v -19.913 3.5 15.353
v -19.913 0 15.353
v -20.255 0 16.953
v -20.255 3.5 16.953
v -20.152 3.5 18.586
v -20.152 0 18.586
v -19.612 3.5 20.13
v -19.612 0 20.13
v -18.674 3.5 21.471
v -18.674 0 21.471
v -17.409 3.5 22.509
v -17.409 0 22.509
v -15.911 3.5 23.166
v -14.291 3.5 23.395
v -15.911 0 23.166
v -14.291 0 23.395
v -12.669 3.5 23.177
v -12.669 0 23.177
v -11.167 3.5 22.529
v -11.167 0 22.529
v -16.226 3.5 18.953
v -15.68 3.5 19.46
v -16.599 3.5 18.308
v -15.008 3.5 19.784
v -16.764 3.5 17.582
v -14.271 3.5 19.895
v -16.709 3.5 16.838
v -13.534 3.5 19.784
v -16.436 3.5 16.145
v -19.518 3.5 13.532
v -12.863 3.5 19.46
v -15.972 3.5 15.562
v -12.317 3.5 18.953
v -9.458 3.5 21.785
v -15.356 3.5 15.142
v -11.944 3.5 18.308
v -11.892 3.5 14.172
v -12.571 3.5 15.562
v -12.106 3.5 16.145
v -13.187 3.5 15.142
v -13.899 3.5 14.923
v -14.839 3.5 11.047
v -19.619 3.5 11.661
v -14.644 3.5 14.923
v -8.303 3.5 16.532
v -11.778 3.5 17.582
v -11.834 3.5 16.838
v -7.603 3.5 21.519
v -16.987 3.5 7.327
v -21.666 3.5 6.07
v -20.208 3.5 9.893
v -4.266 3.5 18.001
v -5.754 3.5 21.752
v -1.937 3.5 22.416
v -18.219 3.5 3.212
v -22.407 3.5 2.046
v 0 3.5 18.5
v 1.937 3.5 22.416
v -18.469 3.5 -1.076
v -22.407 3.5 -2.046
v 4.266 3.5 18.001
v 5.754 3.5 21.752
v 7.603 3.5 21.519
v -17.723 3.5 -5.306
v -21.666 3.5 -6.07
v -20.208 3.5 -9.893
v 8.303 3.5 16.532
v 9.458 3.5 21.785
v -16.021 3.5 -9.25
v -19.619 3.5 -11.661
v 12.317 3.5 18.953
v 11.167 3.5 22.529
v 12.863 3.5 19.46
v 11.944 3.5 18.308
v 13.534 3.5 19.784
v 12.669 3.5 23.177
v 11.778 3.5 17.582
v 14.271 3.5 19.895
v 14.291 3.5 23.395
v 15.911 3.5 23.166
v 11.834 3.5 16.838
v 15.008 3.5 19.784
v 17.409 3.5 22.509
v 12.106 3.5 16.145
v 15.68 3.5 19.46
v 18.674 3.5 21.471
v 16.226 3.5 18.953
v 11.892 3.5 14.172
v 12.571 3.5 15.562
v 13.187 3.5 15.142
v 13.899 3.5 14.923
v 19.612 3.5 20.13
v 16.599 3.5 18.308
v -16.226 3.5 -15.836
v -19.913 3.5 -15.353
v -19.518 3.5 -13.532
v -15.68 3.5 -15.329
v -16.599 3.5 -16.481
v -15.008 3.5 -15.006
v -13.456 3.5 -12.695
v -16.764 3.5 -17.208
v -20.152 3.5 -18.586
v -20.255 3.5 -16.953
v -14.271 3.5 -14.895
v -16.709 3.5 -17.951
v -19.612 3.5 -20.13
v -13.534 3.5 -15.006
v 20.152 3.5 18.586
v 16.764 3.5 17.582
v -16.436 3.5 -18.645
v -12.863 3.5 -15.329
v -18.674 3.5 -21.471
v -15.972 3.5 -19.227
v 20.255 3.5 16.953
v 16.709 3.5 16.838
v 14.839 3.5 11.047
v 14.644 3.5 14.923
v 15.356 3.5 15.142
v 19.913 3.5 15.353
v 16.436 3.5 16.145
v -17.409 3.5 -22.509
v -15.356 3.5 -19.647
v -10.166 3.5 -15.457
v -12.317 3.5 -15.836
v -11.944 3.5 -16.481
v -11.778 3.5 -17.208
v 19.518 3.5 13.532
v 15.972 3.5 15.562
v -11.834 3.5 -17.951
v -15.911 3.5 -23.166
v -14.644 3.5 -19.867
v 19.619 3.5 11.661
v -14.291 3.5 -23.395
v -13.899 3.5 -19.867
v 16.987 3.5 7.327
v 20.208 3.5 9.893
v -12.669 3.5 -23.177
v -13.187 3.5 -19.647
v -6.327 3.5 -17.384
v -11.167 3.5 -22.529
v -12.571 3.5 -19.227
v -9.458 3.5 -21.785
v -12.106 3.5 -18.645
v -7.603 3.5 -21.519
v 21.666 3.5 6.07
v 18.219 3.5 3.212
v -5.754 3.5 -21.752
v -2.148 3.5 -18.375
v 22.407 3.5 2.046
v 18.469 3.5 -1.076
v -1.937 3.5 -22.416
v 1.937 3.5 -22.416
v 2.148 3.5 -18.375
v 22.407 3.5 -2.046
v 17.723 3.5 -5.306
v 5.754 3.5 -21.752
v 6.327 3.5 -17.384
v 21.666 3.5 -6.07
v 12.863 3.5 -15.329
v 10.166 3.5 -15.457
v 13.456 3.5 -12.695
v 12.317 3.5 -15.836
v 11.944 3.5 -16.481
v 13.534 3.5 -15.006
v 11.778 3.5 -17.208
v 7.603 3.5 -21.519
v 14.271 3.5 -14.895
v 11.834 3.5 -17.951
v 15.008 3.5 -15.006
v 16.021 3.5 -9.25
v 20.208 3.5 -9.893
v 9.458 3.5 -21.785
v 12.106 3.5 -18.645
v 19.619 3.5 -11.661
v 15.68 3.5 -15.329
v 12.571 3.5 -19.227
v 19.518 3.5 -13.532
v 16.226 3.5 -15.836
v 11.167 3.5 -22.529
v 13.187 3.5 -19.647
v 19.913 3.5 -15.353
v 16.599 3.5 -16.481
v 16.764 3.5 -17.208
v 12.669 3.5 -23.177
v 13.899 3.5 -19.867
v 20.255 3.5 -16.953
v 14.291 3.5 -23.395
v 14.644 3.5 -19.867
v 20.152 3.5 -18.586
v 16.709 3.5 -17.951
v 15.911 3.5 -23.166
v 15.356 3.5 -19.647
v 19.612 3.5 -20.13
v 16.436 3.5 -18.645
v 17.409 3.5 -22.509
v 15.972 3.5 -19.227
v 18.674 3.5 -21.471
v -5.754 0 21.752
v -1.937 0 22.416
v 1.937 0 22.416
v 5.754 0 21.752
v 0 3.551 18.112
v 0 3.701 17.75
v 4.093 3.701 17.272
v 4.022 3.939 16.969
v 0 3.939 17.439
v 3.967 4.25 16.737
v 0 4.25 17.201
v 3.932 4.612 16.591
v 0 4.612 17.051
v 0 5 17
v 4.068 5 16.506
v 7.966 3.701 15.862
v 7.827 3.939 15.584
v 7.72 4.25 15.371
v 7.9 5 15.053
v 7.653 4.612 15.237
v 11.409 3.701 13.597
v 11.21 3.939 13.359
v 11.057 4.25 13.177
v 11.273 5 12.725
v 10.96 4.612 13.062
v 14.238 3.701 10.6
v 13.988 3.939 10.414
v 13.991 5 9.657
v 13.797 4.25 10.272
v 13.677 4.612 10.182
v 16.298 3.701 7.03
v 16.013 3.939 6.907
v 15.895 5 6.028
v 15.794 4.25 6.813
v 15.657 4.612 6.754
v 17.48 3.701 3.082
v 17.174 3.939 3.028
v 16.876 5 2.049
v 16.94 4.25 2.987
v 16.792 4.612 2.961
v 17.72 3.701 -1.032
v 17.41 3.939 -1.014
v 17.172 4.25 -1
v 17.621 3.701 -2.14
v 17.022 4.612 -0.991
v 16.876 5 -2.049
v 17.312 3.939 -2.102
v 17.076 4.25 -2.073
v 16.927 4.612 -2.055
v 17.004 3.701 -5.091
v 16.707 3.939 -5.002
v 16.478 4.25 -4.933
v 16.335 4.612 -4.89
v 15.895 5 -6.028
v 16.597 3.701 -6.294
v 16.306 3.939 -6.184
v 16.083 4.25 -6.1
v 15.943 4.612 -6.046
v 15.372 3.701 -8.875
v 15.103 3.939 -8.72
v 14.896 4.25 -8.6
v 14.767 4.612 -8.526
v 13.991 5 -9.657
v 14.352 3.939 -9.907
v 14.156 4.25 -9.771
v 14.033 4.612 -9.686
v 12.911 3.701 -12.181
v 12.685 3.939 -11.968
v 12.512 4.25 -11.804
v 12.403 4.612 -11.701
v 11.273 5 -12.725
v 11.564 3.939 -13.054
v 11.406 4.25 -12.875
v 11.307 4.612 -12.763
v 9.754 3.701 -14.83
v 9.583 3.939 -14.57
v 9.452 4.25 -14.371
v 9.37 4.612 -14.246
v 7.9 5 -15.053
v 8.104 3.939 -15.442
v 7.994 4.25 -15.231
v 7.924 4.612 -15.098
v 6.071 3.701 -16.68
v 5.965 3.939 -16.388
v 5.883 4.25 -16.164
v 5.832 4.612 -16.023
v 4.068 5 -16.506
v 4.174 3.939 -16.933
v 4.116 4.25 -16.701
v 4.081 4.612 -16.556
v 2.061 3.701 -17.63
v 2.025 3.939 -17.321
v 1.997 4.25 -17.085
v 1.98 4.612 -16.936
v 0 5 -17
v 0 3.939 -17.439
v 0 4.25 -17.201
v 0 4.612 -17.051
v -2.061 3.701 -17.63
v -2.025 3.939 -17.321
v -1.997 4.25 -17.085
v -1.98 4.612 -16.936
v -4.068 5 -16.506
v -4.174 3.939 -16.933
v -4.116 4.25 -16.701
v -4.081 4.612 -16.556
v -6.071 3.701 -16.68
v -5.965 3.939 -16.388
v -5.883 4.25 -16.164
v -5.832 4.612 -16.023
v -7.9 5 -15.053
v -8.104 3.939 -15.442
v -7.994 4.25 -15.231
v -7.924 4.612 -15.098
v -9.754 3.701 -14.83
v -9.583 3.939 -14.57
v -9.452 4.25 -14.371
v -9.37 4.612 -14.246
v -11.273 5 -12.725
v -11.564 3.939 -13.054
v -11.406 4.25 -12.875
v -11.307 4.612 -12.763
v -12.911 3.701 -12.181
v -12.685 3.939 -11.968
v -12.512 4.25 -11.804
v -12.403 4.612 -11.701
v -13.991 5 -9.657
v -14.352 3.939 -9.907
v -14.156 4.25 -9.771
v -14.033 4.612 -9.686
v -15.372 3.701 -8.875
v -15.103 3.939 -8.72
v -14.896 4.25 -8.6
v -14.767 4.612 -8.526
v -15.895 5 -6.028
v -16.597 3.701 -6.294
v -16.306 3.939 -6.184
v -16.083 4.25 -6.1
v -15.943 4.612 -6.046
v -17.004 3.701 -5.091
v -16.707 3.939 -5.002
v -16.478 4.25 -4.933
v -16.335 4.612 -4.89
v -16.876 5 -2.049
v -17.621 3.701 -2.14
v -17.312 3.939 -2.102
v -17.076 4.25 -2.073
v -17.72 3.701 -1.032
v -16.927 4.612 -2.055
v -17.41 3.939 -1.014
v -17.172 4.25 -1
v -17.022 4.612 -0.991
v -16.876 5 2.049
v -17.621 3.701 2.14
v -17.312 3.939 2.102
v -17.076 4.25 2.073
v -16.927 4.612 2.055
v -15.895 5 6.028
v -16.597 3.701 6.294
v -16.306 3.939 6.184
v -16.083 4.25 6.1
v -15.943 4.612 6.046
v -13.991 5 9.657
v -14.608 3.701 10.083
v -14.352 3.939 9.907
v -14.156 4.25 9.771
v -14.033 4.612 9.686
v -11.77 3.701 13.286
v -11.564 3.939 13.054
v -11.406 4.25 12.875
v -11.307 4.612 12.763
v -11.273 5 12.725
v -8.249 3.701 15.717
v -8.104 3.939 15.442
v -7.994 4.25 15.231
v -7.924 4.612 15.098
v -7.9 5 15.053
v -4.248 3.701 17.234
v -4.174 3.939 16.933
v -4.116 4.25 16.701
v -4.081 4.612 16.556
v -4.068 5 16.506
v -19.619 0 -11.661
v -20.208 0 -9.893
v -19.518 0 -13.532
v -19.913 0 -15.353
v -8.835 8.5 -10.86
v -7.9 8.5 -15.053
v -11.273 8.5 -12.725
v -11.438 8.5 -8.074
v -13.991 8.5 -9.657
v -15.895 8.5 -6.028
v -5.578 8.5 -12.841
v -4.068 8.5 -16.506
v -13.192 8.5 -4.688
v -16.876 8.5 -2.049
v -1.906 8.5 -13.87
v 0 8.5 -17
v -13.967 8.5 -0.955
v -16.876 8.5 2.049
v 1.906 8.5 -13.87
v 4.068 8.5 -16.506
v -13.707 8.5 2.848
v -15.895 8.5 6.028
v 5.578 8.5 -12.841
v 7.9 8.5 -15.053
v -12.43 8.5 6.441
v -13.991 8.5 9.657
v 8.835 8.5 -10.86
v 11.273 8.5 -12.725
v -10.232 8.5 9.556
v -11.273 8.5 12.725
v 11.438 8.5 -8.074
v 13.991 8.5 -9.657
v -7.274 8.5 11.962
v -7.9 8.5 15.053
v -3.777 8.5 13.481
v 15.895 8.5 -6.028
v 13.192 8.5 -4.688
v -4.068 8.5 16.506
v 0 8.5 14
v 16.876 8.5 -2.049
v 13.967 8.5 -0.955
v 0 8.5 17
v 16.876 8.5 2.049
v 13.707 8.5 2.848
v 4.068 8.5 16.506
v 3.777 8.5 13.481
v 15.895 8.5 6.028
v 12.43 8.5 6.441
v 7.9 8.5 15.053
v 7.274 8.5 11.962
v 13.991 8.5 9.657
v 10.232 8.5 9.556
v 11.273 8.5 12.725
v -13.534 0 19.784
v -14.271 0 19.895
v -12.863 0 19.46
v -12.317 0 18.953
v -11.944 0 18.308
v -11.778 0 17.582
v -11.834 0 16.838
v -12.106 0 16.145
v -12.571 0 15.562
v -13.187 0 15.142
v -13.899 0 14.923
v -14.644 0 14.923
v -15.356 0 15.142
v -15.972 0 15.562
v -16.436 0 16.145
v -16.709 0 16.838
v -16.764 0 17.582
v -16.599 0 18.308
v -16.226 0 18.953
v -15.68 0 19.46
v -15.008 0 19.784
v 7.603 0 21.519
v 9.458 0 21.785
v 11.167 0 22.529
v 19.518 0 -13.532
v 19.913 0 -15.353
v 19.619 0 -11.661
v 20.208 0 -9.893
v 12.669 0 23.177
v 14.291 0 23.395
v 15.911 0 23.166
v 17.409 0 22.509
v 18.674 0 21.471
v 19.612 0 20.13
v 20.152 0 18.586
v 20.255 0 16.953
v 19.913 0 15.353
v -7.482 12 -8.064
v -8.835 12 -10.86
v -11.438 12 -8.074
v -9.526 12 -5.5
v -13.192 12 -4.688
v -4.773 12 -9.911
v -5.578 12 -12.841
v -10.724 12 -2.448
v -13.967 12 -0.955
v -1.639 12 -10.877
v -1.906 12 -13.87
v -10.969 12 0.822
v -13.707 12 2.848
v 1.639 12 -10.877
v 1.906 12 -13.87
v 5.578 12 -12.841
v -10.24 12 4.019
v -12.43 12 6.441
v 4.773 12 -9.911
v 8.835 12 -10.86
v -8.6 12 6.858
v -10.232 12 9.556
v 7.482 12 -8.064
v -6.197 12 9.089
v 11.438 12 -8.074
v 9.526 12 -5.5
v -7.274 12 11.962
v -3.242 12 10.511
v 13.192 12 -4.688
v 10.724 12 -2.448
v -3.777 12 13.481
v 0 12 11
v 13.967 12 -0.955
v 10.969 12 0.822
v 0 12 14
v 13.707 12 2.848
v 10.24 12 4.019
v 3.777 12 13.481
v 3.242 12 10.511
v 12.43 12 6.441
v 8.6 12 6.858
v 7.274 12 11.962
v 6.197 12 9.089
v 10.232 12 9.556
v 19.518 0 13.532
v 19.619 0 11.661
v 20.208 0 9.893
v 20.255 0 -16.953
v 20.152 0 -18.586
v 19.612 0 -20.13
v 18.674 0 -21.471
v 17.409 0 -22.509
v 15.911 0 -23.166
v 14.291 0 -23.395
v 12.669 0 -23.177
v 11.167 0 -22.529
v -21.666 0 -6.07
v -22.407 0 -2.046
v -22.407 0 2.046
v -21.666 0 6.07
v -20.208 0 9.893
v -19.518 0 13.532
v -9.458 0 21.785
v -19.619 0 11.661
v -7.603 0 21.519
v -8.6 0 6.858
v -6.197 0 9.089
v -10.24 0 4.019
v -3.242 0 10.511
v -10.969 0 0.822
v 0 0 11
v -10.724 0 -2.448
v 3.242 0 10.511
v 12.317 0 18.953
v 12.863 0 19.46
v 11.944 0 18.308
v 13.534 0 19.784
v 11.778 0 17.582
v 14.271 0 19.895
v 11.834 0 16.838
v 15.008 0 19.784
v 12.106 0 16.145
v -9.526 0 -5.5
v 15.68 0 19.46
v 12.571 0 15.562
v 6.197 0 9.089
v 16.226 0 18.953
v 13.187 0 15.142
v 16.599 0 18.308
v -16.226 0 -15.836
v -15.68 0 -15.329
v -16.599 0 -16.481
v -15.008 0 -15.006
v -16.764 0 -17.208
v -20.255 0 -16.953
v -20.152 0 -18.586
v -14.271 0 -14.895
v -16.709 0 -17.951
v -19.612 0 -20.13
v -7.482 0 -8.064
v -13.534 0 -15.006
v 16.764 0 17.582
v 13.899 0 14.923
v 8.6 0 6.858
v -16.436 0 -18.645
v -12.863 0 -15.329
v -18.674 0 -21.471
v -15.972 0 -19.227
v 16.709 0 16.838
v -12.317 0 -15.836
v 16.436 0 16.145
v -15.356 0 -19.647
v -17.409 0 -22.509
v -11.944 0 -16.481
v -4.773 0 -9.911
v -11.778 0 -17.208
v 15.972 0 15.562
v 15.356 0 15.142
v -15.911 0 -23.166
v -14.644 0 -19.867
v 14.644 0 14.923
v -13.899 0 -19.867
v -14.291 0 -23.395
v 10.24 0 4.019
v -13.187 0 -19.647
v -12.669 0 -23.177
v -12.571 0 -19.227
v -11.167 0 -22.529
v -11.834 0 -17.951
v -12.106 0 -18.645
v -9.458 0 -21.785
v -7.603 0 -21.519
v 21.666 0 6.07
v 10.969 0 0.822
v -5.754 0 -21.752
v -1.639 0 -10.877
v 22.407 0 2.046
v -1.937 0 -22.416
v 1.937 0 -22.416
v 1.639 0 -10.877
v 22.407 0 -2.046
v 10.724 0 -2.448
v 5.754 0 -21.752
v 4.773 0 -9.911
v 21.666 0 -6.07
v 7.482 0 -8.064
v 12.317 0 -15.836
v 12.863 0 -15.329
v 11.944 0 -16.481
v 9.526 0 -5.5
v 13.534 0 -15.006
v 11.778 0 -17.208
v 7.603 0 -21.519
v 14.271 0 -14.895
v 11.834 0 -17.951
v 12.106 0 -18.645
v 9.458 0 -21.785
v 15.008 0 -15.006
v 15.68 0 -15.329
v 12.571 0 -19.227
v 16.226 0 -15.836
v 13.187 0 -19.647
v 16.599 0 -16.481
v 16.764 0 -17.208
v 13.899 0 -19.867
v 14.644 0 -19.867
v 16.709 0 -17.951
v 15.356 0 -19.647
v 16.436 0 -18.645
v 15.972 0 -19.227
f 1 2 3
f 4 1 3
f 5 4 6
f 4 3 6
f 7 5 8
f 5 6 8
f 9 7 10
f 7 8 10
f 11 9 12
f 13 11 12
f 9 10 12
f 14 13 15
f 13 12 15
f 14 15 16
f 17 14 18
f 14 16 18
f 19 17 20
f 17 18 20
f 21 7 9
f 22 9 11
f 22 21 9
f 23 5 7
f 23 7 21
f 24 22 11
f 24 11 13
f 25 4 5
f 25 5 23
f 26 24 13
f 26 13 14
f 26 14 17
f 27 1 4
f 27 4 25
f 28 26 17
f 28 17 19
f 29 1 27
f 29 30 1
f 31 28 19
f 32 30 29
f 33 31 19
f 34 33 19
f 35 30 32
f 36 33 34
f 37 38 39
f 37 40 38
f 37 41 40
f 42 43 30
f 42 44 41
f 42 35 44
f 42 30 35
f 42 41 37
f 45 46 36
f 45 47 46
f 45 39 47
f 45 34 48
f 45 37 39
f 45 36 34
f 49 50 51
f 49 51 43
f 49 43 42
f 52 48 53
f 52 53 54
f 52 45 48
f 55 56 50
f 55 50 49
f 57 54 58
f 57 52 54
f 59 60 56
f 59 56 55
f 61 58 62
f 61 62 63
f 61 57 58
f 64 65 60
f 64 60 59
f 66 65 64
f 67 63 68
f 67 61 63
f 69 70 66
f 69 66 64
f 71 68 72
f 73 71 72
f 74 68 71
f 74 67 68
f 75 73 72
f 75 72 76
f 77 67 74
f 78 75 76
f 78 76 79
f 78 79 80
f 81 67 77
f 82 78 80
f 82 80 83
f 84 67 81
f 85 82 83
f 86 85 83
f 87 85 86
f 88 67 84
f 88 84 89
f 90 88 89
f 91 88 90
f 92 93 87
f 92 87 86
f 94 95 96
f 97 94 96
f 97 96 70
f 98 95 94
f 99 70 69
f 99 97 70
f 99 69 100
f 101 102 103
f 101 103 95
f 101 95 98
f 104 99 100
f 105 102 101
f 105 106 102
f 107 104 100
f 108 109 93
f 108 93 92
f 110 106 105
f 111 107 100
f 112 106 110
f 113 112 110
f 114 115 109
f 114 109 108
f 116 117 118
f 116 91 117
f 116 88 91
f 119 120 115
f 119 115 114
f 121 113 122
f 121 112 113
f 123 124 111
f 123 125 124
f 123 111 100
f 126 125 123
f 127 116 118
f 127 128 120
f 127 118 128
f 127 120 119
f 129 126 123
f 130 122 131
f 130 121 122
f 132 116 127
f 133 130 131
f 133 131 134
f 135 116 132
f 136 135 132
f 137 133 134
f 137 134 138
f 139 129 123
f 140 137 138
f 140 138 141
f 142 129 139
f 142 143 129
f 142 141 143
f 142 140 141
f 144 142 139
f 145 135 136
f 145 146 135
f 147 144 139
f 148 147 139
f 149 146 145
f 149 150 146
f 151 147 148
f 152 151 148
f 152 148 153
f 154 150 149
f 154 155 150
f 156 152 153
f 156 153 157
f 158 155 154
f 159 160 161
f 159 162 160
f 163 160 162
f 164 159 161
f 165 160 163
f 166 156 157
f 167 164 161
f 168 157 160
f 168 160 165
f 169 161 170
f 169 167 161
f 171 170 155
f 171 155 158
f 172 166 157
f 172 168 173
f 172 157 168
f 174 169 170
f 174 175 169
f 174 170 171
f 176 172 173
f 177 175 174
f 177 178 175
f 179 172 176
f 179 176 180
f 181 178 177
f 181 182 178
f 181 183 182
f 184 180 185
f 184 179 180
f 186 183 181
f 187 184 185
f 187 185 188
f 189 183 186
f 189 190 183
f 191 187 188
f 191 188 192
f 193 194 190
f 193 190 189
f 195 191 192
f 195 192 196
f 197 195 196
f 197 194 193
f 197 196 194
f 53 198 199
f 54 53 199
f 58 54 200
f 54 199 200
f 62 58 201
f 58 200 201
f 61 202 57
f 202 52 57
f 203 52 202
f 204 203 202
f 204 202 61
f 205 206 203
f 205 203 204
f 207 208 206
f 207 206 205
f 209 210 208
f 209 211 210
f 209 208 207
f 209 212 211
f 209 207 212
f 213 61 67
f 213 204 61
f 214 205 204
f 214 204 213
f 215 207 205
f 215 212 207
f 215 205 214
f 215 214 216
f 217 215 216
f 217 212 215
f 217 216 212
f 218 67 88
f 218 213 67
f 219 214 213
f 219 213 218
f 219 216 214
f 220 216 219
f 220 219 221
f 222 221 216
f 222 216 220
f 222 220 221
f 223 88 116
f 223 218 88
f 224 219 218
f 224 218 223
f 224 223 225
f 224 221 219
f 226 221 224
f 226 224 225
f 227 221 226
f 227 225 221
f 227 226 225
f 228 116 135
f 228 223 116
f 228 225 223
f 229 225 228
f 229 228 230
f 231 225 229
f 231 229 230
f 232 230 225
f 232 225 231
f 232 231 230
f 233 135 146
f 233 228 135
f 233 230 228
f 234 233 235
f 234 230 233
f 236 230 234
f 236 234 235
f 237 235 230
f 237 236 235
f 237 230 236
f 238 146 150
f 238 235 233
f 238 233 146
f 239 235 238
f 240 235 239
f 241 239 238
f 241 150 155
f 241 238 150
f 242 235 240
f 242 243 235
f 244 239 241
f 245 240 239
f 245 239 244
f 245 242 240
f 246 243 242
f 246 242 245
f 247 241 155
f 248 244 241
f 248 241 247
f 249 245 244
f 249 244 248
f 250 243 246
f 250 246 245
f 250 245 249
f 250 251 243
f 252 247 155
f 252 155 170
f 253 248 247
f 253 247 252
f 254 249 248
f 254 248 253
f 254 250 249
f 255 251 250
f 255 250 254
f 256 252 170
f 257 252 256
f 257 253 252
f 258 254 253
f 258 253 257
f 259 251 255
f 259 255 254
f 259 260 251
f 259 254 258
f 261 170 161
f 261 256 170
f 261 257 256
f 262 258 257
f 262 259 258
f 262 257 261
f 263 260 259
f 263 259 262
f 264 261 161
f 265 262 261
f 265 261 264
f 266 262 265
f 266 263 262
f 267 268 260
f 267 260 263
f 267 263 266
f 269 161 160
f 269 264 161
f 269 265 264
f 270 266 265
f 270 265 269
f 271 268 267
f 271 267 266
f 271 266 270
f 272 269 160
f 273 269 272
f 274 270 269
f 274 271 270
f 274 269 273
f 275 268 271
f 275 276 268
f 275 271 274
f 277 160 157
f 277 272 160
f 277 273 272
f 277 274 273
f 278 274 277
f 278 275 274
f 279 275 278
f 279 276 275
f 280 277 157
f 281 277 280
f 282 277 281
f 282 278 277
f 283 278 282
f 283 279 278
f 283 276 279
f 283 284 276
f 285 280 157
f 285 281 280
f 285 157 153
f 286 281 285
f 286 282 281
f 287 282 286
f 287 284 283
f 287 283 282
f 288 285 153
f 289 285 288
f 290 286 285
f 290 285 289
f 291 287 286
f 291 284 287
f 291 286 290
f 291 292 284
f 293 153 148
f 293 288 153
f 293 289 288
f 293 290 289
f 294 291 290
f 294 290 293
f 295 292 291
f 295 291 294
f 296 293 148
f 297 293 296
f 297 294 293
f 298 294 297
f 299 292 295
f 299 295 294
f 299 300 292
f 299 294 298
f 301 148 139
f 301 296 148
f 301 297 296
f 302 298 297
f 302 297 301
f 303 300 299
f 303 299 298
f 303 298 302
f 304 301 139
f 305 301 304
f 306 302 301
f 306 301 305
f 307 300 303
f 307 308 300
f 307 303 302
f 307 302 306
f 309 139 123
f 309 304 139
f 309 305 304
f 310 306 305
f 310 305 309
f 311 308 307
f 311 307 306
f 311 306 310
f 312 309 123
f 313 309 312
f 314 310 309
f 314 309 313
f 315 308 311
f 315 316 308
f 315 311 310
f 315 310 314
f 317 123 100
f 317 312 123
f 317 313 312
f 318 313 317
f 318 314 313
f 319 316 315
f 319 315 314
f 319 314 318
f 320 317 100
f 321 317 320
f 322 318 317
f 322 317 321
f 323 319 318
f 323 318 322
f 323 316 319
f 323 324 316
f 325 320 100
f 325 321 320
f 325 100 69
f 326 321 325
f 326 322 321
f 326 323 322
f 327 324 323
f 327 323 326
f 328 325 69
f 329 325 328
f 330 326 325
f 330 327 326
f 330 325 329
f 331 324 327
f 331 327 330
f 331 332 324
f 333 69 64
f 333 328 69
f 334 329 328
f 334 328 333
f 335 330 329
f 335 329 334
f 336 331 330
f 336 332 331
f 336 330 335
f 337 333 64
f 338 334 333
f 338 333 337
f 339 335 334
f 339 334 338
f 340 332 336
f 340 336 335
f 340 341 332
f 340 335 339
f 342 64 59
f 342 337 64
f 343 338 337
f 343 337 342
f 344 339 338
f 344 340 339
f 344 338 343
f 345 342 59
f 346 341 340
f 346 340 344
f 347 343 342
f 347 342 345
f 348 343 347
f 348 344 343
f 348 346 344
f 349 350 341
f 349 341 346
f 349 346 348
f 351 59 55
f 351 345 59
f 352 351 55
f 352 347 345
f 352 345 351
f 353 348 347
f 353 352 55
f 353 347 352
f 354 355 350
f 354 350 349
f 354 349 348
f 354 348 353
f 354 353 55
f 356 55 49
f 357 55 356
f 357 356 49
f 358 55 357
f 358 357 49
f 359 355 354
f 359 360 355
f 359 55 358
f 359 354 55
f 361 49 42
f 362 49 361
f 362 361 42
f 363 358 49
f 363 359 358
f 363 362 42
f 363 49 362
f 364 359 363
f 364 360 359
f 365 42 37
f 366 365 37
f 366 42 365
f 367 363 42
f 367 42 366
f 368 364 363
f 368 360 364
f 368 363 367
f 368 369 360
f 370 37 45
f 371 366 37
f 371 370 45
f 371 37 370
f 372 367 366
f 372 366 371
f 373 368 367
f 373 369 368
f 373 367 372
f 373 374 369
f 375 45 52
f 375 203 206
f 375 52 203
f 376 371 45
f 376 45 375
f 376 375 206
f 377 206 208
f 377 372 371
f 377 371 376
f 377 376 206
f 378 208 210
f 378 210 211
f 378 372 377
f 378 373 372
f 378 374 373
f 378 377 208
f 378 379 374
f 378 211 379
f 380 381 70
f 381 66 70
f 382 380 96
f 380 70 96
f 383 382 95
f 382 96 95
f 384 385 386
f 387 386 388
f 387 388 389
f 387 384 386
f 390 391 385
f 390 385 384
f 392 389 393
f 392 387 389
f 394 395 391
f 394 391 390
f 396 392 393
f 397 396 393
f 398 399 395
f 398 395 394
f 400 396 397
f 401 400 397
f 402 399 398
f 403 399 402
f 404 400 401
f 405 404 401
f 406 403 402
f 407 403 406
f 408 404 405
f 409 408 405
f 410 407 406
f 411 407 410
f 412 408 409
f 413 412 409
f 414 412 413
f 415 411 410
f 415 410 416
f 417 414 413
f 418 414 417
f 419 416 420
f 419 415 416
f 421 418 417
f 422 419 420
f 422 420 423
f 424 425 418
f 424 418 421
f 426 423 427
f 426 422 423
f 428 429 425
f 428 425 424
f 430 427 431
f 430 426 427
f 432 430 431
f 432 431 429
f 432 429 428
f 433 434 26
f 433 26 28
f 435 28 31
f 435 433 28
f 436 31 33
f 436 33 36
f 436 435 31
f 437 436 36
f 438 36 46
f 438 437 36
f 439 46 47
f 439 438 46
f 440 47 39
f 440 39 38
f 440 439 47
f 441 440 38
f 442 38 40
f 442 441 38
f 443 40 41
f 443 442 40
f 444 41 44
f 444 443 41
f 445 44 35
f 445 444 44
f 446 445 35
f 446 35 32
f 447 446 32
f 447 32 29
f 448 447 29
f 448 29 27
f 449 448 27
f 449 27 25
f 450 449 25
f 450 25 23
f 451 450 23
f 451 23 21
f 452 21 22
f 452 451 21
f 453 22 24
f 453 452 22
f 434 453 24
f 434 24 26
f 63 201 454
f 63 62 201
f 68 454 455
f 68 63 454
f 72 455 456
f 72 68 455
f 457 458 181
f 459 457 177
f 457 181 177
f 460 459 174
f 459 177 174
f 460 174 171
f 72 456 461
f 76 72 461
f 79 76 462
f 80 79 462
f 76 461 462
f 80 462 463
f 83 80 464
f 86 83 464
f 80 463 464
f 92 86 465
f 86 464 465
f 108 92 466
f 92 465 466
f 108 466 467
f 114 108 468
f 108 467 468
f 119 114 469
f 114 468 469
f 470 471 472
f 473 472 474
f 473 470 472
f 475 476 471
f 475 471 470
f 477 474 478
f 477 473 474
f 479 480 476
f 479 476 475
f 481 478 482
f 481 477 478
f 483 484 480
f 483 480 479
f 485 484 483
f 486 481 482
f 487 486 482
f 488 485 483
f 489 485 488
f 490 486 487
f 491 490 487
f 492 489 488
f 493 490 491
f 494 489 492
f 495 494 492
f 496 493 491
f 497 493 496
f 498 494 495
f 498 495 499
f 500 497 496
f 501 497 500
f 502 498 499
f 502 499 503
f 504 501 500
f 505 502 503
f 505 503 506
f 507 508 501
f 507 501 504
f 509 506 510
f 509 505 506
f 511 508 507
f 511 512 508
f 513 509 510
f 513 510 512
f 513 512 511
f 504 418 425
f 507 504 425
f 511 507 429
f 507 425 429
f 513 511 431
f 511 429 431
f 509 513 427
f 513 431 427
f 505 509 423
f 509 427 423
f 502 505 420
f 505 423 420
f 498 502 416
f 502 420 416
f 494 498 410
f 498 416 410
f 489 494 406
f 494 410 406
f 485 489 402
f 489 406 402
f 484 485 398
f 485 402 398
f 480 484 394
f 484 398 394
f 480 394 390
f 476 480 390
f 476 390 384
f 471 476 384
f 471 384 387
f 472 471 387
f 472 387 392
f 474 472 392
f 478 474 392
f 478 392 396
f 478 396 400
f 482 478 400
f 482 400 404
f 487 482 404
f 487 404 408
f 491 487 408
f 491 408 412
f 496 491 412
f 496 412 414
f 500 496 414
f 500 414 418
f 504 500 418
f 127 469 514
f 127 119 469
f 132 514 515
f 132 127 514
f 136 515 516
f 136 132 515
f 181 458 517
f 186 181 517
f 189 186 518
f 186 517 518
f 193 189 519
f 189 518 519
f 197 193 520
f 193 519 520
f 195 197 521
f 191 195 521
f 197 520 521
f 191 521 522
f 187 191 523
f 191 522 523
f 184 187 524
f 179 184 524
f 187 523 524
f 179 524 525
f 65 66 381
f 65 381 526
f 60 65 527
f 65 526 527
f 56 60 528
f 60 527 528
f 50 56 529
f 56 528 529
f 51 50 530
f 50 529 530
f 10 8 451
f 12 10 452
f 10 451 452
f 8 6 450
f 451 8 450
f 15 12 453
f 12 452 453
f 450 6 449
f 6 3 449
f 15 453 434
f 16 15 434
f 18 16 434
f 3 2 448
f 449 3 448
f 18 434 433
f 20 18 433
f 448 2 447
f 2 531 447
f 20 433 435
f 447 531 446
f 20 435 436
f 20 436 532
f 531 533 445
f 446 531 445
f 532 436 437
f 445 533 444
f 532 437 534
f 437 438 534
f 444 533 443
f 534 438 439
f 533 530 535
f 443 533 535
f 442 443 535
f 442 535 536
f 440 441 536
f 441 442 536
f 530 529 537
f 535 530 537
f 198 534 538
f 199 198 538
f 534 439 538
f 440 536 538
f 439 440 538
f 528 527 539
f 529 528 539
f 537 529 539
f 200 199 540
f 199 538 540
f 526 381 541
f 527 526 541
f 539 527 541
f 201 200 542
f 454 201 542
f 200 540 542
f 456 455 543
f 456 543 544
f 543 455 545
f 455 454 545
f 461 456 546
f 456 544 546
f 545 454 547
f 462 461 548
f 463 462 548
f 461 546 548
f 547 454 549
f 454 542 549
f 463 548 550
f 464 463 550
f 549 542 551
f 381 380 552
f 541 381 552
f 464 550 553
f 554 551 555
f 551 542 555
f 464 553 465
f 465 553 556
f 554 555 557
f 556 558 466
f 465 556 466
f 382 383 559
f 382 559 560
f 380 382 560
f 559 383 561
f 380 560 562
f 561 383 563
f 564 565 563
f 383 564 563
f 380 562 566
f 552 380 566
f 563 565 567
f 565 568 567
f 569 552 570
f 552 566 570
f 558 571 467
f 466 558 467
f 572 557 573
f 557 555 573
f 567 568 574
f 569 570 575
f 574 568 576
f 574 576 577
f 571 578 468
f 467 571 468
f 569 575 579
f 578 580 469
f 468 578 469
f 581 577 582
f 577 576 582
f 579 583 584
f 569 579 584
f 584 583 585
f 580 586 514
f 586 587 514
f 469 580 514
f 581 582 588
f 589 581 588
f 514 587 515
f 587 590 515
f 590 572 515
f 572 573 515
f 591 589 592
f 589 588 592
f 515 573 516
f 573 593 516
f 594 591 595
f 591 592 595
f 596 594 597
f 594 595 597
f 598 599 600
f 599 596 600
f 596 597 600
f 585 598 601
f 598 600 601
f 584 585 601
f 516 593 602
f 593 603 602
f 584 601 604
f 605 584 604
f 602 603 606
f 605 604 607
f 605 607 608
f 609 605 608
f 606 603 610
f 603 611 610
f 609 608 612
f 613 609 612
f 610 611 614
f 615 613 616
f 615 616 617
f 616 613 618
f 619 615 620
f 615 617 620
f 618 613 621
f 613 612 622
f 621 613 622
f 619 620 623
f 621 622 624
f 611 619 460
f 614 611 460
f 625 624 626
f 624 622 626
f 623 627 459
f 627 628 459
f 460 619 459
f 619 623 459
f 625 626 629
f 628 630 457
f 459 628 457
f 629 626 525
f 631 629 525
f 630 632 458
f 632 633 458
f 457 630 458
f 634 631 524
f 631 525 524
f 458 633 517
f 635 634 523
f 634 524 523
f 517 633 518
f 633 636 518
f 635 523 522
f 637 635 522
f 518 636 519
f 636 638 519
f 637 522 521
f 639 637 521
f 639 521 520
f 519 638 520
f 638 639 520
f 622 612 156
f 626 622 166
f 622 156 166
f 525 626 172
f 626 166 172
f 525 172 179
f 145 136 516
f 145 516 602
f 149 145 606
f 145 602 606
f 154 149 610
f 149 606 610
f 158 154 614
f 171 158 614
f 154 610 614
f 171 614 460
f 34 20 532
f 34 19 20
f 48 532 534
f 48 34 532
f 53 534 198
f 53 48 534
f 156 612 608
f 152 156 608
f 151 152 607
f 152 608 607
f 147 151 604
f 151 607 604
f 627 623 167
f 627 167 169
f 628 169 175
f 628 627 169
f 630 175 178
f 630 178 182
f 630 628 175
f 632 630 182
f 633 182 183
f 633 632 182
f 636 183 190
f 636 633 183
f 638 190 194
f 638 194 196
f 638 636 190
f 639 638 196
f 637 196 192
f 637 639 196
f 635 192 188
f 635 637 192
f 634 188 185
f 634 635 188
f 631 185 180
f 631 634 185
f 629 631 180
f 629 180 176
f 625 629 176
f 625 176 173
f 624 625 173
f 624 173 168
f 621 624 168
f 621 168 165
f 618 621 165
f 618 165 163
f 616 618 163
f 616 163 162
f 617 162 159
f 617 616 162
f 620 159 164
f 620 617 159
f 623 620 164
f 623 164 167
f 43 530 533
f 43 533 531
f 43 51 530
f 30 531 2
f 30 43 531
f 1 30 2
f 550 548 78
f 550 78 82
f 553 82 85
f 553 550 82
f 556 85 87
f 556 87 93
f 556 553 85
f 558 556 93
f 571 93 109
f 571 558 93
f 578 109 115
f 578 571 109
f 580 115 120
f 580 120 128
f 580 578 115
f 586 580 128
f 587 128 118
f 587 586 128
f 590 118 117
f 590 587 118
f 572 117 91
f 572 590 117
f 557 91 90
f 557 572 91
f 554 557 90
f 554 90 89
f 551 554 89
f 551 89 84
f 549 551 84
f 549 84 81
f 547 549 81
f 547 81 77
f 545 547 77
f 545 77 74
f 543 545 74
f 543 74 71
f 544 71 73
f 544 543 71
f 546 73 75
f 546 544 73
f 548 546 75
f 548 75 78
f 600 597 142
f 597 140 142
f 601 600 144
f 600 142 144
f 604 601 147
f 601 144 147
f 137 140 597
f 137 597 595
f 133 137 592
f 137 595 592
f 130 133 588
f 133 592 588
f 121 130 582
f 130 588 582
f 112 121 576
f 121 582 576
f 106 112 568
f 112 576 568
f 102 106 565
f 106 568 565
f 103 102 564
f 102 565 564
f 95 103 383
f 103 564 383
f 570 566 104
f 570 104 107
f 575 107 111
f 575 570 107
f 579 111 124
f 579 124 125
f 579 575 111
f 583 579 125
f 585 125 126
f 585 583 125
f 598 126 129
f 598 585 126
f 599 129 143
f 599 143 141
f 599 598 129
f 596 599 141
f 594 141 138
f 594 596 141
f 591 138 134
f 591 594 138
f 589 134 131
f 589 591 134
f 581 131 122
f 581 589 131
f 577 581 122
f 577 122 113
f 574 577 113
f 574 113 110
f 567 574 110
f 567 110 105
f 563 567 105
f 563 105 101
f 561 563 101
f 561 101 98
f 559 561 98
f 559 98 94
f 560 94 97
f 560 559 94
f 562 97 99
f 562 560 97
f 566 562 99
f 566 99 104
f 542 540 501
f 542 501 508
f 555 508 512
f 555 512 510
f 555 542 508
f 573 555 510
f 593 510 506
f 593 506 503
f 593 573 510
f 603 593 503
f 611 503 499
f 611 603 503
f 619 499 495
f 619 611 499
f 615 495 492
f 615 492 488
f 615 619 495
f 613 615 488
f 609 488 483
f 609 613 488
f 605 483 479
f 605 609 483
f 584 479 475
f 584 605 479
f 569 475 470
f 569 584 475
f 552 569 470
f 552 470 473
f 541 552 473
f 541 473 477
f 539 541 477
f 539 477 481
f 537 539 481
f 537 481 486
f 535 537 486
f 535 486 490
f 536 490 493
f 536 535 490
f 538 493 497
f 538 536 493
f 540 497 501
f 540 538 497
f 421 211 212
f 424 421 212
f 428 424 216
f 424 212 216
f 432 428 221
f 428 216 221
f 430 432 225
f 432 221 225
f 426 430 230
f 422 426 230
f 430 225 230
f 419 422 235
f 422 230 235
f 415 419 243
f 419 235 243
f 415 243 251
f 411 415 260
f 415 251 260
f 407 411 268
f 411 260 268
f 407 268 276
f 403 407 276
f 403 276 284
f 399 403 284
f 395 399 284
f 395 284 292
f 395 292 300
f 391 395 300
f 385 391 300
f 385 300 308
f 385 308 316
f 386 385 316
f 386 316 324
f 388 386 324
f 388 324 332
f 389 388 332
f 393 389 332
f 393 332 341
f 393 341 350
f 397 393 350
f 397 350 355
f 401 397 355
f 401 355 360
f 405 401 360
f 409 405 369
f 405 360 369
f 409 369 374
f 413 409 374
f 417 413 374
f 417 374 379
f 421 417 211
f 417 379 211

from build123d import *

# Parameters (mm, degrees)
SKETCH2_R           = 14
SKETCH2_R_2         = 11
BOSS_EXTRUDE1_DEPTH = 12
SKETCH3_R           = 17
SKETCH3_R_2         = 14
BOSS_EXTRUDE2_DEPTH = 8.5
SKETCH4_R           = 2.5
SKETCH4_R_2         = 17
BOSS_EXTRUDE3_DEPTH = 3.5
FILLET1_R           = 1.5
FILLET2_R           = 7


with BuildPart() as part:
    # Sketch2 → Boss-Extrude1 (new body)
    with BuildSketch(Plane(origin=(0, 0, 0), x_dir=(1, 0, 0), z_dir=(0, 1, 0))):
        with Locations(Location((0, 0, 0), (0, 0, 270))):
            Circle(SKETCH2_R)
        with Locations(Location((0, 0, 0), (0, 0, 270))):
            Circle(SKETCH2_R_2, mode=Mode.SUBTRACT)
    extrude(amount=BOSS_EXTRUDE1_DEPTH)

    # Sketch3 → Boss-Extrude2 (add)
    with BuildSketch(Plane(origin=(0, 0, 0), x_dir=(1, 0, 0), z_dir=(0, 1, 0))):
        with Locations(Location((0, 0, 0), (0, 0, 270))):
            Circle(SKETCH3_R)
        with Locations(Location((0, 0, 0), (0, 0, 270))):
            Circle(SKETCH3_R_2, mode=Mode.SUBTRACT)
    extrude(amount=BOSS_EXTRUDE2_DEPTH)

    # Sketch4 → Boss-Extrude3 (add)
    with BuildSketch(Plane(origin=(0, 0, 0), x_dir=(1, 0, 0), z_dir=(0, 1, 0))):
        with BuildLine():
            ThreePointArc((-18.361144712, 13.004551698), (-22.5, 0), (-18.361144712, -13.004551698))
            ThreePointArc((-18.361144712, -13.004551698), (-18.077090702, -22.033356344), (-9.166775866, -20.547997962))
            ThreePointArc((-9.166775866, -20.547997962), (0, -22.5), (9.166775866, -20.547997962))
            ThreePointArc((9.166775866, -20.547997962), (18.077090702, -22.033356344), (18.361144712, -13.004551698))
            ThreePointArc((18.361144712, -13.004551698), (22.5, 0), (18.361144712, 13.004551698))
            ThreePointArc((18.361144712, 13.004551698), (18.077090702, 22.033356344), (9.166775866, 20.547997962))
            ThreePointArc((9.166775866, 20.547997962), (0, 22.5), (-9.166775866, 20.547997962))
            ThreePointArc((-9.166775866, 20.547997962), (-18.077090702, 22.033356344), (-18.361144712, 13.004551698))
        make_face()
        with Locations(Location((-14.271387396, 17.394755008, 0), (0, 0, 270))):
            Circle(SKETCH4_R, mode=Mode.SUBTRACT)
        with Locations(Location((14.271387396, 17.394755008, 0), (0, 0, 270))):
            Circle(SKETCH4_R, mode=Mode.SUBTRACT)
        with Locations(Location((-14.271387396, -17.394755008, 0), (0, 0, 270))):
            Circle(SKETCH4_R, mode=Mode.SUBTRACT)
        with Locations(Location((14.271387396, -17.394755008, 0), (0, 0, 270))):
            Circle(SKETCH4_R, mode=Mode.SUBTRACT)
        with Locations(Location((0, 0, 0), (0, 0, 270))):
            Circle(SKETCH4_R_2, mode=Mode.SUBTRACT)
    extrude(amount=BOSS_EXTRUDE3_DEPTH)

    # Fillet1
    fillet1_edges = [part.edges().sort_by_distance(p)[0] for p in [
        (0, 3.5, -17),
    ]]
    fillet(fillet1_edges, radius=FILLET1_R)

    # Fillet2
    fillet2_edges = [part.edges().sort_by_distance(p)[0] for p in [
        (-9.166775866, 1.75, 20.547997962),
        (9.166775866, 1.75, 20.547997962),
        (18.361144712, 1.75, 13.004551698),
        (18.361144712, 1.75, -13.004551698),
        (9.166775866, 1.75, -20.547997962),
        (-9.166775866, 1.75, -20.547997962),
        (-18.361144712, 1.75, -13.004551698),
        (-18.361144712, 1.75, 13.004551698),
    ]]
    fillet(fillet2_edges, radius=FILLET2_R)


solid = part.part
